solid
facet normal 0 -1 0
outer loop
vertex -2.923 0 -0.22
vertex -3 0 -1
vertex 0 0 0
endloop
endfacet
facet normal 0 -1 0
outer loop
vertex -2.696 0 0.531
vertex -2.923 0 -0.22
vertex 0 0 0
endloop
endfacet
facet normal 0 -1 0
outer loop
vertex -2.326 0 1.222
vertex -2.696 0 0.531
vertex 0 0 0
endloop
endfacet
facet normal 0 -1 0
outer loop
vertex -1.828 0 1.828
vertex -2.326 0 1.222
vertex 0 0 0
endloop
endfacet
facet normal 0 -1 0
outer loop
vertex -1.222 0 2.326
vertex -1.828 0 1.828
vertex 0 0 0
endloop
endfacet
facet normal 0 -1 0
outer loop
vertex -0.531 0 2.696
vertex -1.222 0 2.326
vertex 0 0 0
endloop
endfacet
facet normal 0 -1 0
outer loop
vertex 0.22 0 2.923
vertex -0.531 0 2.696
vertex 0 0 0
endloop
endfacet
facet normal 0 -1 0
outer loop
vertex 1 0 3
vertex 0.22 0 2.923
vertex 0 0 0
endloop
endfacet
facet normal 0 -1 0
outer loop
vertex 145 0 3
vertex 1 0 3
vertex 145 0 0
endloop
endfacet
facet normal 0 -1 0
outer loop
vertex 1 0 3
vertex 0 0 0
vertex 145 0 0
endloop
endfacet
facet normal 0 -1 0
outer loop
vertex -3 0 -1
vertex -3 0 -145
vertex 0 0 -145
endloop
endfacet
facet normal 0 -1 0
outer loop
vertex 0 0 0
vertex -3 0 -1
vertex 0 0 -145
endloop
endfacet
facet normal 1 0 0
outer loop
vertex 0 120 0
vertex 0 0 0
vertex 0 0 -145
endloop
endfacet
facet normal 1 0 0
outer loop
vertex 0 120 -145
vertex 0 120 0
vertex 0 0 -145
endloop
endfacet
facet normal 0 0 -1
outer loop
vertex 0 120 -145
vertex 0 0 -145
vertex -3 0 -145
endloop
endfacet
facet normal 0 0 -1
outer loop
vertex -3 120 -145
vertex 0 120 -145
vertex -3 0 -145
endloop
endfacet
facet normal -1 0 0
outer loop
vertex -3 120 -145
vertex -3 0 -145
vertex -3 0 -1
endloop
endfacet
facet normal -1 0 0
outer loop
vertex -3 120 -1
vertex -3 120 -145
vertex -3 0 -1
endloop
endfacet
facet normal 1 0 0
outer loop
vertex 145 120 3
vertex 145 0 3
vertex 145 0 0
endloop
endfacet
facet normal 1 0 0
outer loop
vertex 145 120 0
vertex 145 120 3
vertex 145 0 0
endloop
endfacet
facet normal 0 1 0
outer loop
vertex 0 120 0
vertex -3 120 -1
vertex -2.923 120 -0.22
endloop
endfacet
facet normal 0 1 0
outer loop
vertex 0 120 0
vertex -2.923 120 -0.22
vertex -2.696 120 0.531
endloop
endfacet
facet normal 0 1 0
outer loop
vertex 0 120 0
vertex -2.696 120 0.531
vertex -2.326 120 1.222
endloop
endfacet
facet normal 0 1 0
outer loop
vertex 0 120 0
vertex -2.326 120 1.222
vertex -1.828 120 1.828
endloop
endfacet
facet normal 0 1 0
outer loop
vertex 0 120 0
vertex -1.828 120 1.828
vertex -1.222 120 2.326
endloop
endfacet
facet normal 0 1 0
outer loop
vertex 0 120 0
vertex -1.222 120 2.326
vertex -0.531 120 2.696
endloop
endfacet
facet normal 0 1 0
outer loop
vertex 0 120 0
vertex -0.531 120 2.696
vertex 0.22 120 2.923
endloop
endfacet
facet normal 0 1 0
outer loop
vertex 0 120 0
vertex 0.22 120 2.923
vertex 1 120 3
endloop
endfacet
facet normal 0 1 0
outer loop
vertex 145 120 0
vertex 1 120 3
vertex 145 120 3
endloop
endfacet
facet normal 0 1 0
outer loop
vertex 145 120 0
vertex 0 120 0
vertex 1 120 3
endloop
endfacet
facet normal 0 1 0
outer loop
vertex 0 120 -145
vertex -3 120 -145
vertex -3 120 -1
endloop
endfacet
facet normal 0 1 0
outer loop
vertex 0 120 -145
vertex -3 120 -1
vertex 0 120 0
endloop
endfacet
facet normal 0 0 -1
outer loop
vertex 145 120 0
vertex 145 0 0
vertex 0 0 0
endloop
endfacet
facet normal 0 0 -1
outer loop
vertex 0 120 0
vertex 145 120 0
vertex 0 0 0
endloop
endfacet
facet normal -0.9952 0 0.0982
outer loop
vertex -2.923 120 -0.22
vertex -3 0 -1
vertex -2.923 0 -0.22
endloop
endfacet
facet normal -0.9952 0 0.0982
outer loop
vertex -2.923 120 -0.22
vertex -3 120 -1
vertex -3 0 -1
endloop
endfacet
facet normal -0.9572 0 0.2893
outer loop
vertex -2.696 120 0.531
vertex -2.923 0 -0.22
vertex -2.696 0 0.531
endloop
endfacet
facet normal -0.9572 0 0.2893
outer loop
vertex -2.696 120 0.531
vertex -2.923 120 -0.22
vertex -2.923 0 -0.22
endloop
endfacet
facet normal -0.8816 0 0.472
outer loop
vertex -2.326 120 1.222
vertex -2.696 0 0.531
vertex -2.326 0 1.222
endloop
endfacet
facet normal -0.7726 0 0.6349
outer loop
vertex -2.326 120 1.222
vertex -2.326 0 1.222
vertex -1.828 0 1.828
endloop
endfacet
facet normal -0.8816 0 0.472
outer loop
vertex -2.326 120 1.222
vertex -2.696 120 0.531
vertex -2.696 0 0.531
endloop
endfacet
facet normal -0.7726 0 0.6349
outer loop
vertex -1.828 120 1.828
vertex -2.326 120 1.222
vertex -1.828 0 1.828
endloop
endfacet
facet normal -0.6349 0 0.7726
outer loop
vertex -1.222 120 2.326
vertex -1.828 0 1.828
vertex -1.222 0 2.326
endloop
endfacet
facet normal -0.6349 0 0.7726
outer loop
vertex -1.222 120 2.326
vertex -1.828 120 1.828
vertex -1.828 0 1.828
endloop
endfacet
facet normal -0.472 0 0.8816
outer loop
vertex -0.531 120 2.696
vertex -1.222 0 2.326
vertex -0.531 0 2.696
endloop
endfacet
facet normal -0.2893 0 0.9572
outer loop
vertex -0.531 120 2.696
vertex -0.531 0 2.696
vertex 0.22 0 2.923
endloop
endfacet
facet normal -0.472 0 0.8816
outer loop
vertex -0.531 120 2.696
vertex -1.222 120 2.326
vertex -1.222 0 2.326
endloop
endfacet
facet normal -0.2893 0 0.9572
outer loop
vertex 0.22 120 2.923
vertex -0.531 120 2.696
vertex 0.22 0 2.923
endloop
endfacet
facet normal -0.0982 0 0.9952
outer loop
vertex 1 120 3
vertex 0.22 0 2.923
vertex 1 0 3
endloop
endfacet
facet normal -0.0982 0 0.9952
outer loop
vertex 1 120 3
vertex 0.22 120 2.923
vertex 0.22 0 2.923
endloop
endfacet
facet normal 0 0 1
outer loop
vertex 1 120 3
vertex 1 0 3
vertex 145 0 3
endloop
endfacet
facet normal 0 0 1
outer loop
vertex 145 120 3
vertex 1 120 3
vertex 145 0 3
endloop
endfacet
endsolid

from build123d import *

# Parameters (mm, degrees)
BOSS_EXTRUDE1_DEPTH = 120
FILLET1_R           = 4


with BuildPart() as part:
    # Sketch1 → Boss-Extrude1 (new body)
    with BuildSketch(Plane(origin=(0, 0, 0), x_dir=(1, 0, 0), z_dir=(0, 1, 0))):
        Polygon((145, 0), (0, 0), (0, 145), (-3, 145), (-3, -3), (145, -3), align=None)
    extrude(amount=BOSS_EXTRUDE1_DEPTH)

    # Fillet1
    fillet1_edges = [part.edges().sort_by_distance(p)[0] for p in [
        (-3, 60, 3),
    ]]
    fillet(fillet1_edges, radius=FILLET1_R)


solid = part.part
